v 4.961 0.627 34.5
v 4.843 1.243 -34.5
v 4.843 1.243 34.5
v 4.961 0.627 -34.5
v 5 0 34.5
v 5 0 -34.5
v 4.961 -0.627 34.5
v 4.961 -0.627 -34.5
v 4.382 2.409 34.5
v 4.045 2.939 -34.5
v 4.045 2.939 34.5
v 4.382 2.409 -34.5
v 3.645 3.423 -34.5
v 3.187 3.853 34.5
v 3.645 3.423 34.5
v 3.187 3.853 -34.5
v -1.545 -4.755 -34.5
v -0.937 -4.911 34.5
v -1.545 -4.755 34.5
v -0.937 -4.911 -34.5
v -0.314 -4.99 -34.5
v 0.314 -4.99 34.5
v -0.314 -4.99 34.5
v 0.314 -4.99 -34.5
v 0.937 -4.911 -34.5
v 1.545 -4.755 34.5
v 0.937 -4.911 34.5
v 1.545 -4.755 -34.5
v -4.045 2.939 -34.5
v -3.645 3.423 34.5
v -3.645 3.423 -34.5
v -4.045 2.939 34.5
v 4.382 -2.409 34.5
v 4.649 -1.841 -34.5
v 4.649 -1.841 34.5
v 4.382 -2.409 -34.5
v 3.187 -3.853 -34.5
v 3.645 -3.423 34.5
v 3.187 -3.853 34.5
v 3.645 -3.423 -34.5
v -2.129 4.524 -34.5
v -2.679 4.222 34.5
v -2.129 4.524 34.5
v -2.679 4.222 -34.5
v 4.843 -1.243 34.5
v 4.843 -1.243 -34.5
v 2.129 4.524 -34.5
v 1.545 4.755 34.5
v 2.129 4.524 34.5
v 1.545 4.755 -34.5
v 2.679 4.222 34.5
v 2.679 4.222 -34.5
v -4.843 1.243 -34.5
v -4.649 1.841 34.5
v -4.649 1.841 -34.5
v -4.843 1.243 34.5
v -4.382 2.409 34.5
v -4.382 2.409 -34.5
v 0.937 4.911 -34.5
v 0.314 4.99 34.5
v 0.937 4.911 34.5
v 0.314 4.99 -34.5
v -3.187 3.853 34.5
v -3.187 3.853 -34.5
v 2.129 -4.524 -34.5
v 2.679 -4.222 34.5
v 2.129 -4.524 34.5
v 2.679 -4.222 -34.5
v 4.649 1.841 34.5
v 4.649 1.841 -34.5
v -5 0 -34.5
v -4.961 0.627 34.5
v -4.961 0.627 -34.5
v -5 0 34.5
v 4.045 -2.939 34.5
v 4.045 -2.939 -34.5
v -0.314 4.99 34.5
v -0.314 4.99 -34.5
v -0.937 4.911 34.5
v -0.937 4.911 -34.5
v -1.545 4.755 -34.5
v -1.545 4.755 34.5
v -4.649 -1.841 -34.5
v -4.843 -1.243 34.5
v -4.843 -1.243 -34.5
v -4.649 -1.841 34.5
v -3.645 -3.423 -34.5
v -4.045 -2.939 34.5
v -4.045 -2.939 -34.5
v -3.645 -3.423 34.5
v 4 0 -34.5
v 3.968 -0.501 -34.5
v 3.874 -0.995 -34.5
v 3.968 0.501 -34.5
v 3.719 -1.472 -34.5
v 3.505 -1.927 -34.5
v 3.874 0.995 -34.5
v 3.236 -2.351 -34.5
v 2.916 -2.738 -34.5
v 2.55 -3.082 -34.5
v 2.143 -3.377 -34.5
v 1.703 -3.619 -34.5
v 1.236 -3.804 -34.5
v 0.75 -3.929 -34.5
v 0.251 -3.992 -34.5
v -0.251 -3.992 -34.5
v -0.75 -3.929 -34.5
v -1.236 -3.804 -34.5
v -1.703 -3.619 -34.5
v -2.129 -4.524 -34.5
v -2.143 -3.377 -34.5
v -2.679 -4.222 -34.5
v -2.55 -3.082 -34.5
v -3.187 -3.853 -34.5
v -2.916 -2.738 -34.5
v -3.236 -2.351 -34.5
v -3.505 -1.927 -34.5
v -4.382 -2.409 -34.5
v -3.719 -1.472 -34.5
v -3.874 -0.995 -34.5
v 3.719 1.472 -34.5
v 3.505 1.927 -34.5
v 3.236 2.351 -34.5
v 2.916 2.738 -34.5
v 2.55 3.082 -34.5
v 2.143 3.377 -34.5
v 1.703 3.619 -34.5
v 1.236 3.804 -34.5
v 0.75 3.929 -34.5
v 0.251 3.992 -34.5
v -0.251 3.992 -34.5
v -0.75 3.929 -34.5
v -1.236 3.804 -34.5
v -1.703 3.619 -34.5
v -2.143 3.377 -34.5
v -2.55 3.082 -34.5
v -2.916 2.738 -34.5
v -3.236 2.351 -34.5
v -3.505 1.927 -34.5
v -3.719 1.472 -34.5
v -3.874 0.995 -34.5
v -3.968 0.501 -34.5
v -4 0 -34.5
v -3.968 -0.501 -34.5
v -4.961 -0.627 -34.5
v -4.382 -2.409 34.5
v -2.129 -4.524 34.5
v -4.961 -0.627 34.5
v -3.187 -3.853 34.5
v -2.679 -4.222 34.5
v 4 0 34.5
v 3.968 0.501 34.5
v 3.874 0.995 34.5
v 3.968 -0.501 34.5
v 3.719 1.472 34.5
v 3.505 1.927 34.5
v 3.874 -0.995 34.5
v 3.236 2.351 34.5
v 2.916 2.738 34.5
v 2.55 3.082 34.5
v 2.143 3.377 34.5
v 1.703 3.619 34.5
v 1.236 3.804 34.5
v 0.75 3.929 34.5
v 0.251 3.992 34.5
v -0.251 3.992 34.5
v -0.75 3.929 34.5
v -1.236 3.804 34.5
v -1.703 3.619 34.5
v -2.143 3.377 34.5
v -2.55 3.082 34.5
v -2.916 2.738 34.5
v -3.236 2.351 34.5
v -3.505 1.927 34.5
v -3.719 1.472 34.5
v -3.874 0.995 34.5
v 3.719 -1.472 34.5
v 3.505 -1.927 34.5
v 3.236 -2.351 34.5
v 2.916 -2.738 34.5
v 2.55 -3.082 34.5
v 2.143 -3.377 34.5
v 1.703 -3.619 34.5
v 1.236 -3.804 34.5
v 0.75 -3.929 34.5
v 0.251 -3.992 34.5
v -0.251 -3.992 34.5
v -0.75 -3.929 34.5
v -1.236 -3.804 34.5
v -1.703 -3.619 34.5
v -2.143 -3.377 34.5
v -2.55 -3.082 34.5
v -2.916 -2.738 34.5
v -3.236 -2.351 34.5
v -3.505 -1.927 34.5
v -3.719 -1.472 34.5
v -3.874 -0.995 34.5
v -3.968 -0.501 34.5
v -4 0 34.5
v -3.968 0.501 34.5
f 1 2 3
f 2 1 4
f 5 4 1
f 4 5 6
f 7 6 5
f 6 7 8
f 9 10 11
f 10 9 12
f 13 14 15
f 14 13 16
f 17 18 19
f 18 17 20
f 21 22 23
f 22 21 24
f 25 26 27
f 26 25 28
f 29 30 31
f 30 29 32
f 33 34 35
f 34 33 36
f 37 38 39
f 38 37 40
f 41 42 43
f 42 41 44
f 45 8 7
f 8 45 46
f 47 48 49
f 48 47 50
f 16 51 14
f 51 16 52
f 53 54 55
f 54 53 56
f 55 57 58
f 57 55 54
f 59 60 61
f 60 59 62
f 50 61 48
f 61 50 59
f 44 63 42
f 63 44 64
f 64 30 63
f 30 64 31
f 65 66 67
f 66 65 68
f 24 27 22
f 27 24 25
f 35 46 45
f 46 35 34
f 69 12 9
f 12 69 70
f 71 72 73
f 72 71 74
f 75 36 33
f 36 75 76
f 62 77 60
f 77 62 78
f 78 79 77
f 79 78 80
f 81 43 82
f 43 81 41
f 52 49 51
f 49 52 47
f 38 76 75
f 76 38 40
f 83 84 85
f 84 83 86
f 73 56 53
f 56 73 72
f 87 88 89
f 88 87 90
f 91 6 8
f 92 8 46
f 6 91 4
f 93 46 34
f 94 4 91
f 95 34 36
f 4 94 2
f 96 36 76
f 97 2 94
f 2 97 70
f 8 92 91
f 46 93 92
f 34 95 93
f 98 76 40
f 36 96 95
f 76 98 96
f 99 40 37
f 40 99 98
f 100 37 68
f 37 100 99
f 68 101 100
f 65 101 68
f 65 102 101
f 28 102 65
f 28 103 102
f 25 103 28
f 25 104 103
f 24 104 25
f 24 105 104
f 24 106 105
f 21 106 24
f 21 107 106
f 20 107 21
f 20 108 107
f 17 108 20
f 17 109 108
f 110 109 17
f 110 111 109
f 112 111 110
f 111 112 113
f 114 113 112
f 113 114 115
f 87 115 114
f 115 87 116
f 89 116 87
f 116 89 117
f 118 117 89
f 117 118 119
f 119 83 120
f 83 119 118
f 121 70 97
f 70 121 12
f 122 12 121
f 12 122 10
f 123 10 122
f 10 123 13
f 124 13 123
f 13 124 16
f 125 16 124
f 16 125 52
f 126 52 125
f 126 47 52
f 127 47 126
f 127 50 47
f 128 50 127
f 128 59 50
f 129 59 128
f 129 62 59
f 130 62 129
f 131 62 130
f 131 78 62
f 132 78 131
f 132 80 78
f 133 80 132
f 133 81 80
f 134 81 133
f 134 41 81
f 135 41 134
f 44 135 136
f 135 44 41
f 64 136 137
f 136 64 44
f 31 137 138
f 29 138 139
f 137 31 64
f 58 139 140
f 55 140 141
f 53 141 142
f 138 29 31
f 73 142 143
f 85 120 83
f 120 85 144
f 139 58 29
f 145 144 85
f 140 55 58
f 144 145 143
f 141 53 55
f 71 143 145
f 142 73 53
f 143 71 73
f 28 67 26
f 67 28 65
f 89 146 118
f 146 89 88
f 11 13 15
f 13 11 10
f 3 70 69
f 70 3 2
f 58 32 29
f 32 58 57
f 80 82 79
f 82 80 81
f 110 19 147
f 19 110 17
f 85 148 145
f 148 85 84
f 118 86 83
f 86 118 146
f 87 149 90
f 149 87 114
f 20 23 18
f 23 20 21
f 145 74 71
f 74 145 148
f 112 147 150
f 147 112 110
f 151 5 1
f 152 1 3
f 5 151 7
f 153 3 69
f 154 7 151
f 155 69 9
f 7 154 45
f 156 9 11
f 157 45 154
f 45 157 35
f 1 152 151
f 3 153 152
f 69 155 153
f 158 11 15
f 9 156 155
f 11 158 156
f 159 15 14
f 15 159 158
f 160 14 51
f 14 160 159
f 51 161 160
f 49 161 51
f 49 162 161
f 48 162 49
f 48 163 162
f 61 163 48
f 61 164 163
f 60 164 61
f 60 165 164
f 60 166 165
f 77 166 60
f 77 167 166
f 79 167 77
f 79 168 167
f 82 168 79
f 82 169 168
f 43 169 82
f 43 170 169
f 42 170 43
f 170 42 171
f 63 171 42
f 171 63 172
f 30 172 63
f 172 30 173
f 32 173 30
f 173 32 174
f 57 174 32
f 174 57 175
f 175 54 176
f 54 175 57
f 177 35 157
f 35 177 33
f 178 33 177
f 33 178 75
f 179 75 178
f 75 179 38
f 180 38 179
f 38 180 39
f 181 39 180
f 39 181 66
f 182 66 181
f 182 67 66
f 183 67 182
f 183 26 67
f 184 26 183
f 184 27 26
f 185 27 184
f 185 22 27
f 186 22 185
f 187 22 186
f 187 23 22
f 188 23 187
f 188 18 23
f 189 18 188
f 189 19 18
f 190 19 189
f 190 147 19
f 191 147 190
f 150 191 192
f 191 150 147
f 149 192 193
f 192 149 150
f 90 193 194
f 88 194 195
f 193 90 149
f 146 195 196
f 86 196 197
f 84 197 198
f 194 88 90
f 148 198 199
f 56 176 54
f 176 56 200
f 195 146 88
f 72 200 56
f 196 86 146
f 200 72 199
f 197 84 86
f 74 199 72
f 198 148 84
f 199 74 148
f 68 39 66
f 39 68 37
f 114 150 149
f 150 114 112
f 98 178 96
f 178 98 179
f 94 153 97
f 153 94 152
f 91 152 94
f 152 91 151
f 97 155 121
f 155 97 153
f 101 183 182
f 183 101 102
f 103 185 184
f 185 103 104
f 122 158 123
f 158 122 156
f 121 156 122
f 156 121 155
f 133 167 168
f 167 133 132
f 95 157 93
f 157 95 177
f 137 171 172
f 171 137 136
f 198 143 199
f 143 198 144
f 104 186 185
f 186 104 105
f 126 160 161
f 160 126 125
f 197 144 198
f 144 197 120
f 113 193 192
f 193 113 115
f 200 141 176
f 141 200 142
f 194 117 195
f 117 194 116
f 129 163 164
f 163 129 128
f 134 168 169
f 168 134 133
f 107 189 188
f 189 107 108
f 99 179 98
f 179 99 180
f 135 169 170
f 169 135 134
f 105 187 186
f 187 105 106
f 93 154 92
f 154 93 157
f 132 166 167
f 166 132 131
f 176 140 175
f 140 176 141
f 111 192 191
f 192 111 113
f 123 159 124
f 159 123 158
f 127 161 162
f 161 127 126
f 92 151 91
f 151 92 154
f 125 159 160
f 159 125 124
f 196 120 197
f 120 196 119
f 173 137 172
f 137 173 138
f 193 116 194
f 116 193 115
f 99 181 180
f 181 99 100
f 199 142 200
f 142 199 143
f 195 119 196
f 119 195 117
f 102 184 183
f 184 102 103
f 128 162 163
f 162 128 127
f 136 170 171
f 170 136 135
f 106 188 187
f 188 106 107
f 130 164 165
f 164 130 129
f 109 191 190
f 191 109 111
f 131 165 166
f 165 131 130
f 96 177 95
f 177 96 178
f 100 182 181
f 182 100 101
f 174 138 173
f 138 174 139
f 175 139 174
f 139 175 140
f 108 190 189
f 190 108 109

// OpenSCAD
$fn = 50;


difference() {
	union() {
		translate(v = [0, 0, -34.5000000000]) {
			cylinder(h = 69, r = 5.0000000000);
		}
	}
	union() {
		translate(v = [0, 0, -100.0000000000]) {
			cylinder(h = 200, r = 4.0000000000);
		}
	}
}
